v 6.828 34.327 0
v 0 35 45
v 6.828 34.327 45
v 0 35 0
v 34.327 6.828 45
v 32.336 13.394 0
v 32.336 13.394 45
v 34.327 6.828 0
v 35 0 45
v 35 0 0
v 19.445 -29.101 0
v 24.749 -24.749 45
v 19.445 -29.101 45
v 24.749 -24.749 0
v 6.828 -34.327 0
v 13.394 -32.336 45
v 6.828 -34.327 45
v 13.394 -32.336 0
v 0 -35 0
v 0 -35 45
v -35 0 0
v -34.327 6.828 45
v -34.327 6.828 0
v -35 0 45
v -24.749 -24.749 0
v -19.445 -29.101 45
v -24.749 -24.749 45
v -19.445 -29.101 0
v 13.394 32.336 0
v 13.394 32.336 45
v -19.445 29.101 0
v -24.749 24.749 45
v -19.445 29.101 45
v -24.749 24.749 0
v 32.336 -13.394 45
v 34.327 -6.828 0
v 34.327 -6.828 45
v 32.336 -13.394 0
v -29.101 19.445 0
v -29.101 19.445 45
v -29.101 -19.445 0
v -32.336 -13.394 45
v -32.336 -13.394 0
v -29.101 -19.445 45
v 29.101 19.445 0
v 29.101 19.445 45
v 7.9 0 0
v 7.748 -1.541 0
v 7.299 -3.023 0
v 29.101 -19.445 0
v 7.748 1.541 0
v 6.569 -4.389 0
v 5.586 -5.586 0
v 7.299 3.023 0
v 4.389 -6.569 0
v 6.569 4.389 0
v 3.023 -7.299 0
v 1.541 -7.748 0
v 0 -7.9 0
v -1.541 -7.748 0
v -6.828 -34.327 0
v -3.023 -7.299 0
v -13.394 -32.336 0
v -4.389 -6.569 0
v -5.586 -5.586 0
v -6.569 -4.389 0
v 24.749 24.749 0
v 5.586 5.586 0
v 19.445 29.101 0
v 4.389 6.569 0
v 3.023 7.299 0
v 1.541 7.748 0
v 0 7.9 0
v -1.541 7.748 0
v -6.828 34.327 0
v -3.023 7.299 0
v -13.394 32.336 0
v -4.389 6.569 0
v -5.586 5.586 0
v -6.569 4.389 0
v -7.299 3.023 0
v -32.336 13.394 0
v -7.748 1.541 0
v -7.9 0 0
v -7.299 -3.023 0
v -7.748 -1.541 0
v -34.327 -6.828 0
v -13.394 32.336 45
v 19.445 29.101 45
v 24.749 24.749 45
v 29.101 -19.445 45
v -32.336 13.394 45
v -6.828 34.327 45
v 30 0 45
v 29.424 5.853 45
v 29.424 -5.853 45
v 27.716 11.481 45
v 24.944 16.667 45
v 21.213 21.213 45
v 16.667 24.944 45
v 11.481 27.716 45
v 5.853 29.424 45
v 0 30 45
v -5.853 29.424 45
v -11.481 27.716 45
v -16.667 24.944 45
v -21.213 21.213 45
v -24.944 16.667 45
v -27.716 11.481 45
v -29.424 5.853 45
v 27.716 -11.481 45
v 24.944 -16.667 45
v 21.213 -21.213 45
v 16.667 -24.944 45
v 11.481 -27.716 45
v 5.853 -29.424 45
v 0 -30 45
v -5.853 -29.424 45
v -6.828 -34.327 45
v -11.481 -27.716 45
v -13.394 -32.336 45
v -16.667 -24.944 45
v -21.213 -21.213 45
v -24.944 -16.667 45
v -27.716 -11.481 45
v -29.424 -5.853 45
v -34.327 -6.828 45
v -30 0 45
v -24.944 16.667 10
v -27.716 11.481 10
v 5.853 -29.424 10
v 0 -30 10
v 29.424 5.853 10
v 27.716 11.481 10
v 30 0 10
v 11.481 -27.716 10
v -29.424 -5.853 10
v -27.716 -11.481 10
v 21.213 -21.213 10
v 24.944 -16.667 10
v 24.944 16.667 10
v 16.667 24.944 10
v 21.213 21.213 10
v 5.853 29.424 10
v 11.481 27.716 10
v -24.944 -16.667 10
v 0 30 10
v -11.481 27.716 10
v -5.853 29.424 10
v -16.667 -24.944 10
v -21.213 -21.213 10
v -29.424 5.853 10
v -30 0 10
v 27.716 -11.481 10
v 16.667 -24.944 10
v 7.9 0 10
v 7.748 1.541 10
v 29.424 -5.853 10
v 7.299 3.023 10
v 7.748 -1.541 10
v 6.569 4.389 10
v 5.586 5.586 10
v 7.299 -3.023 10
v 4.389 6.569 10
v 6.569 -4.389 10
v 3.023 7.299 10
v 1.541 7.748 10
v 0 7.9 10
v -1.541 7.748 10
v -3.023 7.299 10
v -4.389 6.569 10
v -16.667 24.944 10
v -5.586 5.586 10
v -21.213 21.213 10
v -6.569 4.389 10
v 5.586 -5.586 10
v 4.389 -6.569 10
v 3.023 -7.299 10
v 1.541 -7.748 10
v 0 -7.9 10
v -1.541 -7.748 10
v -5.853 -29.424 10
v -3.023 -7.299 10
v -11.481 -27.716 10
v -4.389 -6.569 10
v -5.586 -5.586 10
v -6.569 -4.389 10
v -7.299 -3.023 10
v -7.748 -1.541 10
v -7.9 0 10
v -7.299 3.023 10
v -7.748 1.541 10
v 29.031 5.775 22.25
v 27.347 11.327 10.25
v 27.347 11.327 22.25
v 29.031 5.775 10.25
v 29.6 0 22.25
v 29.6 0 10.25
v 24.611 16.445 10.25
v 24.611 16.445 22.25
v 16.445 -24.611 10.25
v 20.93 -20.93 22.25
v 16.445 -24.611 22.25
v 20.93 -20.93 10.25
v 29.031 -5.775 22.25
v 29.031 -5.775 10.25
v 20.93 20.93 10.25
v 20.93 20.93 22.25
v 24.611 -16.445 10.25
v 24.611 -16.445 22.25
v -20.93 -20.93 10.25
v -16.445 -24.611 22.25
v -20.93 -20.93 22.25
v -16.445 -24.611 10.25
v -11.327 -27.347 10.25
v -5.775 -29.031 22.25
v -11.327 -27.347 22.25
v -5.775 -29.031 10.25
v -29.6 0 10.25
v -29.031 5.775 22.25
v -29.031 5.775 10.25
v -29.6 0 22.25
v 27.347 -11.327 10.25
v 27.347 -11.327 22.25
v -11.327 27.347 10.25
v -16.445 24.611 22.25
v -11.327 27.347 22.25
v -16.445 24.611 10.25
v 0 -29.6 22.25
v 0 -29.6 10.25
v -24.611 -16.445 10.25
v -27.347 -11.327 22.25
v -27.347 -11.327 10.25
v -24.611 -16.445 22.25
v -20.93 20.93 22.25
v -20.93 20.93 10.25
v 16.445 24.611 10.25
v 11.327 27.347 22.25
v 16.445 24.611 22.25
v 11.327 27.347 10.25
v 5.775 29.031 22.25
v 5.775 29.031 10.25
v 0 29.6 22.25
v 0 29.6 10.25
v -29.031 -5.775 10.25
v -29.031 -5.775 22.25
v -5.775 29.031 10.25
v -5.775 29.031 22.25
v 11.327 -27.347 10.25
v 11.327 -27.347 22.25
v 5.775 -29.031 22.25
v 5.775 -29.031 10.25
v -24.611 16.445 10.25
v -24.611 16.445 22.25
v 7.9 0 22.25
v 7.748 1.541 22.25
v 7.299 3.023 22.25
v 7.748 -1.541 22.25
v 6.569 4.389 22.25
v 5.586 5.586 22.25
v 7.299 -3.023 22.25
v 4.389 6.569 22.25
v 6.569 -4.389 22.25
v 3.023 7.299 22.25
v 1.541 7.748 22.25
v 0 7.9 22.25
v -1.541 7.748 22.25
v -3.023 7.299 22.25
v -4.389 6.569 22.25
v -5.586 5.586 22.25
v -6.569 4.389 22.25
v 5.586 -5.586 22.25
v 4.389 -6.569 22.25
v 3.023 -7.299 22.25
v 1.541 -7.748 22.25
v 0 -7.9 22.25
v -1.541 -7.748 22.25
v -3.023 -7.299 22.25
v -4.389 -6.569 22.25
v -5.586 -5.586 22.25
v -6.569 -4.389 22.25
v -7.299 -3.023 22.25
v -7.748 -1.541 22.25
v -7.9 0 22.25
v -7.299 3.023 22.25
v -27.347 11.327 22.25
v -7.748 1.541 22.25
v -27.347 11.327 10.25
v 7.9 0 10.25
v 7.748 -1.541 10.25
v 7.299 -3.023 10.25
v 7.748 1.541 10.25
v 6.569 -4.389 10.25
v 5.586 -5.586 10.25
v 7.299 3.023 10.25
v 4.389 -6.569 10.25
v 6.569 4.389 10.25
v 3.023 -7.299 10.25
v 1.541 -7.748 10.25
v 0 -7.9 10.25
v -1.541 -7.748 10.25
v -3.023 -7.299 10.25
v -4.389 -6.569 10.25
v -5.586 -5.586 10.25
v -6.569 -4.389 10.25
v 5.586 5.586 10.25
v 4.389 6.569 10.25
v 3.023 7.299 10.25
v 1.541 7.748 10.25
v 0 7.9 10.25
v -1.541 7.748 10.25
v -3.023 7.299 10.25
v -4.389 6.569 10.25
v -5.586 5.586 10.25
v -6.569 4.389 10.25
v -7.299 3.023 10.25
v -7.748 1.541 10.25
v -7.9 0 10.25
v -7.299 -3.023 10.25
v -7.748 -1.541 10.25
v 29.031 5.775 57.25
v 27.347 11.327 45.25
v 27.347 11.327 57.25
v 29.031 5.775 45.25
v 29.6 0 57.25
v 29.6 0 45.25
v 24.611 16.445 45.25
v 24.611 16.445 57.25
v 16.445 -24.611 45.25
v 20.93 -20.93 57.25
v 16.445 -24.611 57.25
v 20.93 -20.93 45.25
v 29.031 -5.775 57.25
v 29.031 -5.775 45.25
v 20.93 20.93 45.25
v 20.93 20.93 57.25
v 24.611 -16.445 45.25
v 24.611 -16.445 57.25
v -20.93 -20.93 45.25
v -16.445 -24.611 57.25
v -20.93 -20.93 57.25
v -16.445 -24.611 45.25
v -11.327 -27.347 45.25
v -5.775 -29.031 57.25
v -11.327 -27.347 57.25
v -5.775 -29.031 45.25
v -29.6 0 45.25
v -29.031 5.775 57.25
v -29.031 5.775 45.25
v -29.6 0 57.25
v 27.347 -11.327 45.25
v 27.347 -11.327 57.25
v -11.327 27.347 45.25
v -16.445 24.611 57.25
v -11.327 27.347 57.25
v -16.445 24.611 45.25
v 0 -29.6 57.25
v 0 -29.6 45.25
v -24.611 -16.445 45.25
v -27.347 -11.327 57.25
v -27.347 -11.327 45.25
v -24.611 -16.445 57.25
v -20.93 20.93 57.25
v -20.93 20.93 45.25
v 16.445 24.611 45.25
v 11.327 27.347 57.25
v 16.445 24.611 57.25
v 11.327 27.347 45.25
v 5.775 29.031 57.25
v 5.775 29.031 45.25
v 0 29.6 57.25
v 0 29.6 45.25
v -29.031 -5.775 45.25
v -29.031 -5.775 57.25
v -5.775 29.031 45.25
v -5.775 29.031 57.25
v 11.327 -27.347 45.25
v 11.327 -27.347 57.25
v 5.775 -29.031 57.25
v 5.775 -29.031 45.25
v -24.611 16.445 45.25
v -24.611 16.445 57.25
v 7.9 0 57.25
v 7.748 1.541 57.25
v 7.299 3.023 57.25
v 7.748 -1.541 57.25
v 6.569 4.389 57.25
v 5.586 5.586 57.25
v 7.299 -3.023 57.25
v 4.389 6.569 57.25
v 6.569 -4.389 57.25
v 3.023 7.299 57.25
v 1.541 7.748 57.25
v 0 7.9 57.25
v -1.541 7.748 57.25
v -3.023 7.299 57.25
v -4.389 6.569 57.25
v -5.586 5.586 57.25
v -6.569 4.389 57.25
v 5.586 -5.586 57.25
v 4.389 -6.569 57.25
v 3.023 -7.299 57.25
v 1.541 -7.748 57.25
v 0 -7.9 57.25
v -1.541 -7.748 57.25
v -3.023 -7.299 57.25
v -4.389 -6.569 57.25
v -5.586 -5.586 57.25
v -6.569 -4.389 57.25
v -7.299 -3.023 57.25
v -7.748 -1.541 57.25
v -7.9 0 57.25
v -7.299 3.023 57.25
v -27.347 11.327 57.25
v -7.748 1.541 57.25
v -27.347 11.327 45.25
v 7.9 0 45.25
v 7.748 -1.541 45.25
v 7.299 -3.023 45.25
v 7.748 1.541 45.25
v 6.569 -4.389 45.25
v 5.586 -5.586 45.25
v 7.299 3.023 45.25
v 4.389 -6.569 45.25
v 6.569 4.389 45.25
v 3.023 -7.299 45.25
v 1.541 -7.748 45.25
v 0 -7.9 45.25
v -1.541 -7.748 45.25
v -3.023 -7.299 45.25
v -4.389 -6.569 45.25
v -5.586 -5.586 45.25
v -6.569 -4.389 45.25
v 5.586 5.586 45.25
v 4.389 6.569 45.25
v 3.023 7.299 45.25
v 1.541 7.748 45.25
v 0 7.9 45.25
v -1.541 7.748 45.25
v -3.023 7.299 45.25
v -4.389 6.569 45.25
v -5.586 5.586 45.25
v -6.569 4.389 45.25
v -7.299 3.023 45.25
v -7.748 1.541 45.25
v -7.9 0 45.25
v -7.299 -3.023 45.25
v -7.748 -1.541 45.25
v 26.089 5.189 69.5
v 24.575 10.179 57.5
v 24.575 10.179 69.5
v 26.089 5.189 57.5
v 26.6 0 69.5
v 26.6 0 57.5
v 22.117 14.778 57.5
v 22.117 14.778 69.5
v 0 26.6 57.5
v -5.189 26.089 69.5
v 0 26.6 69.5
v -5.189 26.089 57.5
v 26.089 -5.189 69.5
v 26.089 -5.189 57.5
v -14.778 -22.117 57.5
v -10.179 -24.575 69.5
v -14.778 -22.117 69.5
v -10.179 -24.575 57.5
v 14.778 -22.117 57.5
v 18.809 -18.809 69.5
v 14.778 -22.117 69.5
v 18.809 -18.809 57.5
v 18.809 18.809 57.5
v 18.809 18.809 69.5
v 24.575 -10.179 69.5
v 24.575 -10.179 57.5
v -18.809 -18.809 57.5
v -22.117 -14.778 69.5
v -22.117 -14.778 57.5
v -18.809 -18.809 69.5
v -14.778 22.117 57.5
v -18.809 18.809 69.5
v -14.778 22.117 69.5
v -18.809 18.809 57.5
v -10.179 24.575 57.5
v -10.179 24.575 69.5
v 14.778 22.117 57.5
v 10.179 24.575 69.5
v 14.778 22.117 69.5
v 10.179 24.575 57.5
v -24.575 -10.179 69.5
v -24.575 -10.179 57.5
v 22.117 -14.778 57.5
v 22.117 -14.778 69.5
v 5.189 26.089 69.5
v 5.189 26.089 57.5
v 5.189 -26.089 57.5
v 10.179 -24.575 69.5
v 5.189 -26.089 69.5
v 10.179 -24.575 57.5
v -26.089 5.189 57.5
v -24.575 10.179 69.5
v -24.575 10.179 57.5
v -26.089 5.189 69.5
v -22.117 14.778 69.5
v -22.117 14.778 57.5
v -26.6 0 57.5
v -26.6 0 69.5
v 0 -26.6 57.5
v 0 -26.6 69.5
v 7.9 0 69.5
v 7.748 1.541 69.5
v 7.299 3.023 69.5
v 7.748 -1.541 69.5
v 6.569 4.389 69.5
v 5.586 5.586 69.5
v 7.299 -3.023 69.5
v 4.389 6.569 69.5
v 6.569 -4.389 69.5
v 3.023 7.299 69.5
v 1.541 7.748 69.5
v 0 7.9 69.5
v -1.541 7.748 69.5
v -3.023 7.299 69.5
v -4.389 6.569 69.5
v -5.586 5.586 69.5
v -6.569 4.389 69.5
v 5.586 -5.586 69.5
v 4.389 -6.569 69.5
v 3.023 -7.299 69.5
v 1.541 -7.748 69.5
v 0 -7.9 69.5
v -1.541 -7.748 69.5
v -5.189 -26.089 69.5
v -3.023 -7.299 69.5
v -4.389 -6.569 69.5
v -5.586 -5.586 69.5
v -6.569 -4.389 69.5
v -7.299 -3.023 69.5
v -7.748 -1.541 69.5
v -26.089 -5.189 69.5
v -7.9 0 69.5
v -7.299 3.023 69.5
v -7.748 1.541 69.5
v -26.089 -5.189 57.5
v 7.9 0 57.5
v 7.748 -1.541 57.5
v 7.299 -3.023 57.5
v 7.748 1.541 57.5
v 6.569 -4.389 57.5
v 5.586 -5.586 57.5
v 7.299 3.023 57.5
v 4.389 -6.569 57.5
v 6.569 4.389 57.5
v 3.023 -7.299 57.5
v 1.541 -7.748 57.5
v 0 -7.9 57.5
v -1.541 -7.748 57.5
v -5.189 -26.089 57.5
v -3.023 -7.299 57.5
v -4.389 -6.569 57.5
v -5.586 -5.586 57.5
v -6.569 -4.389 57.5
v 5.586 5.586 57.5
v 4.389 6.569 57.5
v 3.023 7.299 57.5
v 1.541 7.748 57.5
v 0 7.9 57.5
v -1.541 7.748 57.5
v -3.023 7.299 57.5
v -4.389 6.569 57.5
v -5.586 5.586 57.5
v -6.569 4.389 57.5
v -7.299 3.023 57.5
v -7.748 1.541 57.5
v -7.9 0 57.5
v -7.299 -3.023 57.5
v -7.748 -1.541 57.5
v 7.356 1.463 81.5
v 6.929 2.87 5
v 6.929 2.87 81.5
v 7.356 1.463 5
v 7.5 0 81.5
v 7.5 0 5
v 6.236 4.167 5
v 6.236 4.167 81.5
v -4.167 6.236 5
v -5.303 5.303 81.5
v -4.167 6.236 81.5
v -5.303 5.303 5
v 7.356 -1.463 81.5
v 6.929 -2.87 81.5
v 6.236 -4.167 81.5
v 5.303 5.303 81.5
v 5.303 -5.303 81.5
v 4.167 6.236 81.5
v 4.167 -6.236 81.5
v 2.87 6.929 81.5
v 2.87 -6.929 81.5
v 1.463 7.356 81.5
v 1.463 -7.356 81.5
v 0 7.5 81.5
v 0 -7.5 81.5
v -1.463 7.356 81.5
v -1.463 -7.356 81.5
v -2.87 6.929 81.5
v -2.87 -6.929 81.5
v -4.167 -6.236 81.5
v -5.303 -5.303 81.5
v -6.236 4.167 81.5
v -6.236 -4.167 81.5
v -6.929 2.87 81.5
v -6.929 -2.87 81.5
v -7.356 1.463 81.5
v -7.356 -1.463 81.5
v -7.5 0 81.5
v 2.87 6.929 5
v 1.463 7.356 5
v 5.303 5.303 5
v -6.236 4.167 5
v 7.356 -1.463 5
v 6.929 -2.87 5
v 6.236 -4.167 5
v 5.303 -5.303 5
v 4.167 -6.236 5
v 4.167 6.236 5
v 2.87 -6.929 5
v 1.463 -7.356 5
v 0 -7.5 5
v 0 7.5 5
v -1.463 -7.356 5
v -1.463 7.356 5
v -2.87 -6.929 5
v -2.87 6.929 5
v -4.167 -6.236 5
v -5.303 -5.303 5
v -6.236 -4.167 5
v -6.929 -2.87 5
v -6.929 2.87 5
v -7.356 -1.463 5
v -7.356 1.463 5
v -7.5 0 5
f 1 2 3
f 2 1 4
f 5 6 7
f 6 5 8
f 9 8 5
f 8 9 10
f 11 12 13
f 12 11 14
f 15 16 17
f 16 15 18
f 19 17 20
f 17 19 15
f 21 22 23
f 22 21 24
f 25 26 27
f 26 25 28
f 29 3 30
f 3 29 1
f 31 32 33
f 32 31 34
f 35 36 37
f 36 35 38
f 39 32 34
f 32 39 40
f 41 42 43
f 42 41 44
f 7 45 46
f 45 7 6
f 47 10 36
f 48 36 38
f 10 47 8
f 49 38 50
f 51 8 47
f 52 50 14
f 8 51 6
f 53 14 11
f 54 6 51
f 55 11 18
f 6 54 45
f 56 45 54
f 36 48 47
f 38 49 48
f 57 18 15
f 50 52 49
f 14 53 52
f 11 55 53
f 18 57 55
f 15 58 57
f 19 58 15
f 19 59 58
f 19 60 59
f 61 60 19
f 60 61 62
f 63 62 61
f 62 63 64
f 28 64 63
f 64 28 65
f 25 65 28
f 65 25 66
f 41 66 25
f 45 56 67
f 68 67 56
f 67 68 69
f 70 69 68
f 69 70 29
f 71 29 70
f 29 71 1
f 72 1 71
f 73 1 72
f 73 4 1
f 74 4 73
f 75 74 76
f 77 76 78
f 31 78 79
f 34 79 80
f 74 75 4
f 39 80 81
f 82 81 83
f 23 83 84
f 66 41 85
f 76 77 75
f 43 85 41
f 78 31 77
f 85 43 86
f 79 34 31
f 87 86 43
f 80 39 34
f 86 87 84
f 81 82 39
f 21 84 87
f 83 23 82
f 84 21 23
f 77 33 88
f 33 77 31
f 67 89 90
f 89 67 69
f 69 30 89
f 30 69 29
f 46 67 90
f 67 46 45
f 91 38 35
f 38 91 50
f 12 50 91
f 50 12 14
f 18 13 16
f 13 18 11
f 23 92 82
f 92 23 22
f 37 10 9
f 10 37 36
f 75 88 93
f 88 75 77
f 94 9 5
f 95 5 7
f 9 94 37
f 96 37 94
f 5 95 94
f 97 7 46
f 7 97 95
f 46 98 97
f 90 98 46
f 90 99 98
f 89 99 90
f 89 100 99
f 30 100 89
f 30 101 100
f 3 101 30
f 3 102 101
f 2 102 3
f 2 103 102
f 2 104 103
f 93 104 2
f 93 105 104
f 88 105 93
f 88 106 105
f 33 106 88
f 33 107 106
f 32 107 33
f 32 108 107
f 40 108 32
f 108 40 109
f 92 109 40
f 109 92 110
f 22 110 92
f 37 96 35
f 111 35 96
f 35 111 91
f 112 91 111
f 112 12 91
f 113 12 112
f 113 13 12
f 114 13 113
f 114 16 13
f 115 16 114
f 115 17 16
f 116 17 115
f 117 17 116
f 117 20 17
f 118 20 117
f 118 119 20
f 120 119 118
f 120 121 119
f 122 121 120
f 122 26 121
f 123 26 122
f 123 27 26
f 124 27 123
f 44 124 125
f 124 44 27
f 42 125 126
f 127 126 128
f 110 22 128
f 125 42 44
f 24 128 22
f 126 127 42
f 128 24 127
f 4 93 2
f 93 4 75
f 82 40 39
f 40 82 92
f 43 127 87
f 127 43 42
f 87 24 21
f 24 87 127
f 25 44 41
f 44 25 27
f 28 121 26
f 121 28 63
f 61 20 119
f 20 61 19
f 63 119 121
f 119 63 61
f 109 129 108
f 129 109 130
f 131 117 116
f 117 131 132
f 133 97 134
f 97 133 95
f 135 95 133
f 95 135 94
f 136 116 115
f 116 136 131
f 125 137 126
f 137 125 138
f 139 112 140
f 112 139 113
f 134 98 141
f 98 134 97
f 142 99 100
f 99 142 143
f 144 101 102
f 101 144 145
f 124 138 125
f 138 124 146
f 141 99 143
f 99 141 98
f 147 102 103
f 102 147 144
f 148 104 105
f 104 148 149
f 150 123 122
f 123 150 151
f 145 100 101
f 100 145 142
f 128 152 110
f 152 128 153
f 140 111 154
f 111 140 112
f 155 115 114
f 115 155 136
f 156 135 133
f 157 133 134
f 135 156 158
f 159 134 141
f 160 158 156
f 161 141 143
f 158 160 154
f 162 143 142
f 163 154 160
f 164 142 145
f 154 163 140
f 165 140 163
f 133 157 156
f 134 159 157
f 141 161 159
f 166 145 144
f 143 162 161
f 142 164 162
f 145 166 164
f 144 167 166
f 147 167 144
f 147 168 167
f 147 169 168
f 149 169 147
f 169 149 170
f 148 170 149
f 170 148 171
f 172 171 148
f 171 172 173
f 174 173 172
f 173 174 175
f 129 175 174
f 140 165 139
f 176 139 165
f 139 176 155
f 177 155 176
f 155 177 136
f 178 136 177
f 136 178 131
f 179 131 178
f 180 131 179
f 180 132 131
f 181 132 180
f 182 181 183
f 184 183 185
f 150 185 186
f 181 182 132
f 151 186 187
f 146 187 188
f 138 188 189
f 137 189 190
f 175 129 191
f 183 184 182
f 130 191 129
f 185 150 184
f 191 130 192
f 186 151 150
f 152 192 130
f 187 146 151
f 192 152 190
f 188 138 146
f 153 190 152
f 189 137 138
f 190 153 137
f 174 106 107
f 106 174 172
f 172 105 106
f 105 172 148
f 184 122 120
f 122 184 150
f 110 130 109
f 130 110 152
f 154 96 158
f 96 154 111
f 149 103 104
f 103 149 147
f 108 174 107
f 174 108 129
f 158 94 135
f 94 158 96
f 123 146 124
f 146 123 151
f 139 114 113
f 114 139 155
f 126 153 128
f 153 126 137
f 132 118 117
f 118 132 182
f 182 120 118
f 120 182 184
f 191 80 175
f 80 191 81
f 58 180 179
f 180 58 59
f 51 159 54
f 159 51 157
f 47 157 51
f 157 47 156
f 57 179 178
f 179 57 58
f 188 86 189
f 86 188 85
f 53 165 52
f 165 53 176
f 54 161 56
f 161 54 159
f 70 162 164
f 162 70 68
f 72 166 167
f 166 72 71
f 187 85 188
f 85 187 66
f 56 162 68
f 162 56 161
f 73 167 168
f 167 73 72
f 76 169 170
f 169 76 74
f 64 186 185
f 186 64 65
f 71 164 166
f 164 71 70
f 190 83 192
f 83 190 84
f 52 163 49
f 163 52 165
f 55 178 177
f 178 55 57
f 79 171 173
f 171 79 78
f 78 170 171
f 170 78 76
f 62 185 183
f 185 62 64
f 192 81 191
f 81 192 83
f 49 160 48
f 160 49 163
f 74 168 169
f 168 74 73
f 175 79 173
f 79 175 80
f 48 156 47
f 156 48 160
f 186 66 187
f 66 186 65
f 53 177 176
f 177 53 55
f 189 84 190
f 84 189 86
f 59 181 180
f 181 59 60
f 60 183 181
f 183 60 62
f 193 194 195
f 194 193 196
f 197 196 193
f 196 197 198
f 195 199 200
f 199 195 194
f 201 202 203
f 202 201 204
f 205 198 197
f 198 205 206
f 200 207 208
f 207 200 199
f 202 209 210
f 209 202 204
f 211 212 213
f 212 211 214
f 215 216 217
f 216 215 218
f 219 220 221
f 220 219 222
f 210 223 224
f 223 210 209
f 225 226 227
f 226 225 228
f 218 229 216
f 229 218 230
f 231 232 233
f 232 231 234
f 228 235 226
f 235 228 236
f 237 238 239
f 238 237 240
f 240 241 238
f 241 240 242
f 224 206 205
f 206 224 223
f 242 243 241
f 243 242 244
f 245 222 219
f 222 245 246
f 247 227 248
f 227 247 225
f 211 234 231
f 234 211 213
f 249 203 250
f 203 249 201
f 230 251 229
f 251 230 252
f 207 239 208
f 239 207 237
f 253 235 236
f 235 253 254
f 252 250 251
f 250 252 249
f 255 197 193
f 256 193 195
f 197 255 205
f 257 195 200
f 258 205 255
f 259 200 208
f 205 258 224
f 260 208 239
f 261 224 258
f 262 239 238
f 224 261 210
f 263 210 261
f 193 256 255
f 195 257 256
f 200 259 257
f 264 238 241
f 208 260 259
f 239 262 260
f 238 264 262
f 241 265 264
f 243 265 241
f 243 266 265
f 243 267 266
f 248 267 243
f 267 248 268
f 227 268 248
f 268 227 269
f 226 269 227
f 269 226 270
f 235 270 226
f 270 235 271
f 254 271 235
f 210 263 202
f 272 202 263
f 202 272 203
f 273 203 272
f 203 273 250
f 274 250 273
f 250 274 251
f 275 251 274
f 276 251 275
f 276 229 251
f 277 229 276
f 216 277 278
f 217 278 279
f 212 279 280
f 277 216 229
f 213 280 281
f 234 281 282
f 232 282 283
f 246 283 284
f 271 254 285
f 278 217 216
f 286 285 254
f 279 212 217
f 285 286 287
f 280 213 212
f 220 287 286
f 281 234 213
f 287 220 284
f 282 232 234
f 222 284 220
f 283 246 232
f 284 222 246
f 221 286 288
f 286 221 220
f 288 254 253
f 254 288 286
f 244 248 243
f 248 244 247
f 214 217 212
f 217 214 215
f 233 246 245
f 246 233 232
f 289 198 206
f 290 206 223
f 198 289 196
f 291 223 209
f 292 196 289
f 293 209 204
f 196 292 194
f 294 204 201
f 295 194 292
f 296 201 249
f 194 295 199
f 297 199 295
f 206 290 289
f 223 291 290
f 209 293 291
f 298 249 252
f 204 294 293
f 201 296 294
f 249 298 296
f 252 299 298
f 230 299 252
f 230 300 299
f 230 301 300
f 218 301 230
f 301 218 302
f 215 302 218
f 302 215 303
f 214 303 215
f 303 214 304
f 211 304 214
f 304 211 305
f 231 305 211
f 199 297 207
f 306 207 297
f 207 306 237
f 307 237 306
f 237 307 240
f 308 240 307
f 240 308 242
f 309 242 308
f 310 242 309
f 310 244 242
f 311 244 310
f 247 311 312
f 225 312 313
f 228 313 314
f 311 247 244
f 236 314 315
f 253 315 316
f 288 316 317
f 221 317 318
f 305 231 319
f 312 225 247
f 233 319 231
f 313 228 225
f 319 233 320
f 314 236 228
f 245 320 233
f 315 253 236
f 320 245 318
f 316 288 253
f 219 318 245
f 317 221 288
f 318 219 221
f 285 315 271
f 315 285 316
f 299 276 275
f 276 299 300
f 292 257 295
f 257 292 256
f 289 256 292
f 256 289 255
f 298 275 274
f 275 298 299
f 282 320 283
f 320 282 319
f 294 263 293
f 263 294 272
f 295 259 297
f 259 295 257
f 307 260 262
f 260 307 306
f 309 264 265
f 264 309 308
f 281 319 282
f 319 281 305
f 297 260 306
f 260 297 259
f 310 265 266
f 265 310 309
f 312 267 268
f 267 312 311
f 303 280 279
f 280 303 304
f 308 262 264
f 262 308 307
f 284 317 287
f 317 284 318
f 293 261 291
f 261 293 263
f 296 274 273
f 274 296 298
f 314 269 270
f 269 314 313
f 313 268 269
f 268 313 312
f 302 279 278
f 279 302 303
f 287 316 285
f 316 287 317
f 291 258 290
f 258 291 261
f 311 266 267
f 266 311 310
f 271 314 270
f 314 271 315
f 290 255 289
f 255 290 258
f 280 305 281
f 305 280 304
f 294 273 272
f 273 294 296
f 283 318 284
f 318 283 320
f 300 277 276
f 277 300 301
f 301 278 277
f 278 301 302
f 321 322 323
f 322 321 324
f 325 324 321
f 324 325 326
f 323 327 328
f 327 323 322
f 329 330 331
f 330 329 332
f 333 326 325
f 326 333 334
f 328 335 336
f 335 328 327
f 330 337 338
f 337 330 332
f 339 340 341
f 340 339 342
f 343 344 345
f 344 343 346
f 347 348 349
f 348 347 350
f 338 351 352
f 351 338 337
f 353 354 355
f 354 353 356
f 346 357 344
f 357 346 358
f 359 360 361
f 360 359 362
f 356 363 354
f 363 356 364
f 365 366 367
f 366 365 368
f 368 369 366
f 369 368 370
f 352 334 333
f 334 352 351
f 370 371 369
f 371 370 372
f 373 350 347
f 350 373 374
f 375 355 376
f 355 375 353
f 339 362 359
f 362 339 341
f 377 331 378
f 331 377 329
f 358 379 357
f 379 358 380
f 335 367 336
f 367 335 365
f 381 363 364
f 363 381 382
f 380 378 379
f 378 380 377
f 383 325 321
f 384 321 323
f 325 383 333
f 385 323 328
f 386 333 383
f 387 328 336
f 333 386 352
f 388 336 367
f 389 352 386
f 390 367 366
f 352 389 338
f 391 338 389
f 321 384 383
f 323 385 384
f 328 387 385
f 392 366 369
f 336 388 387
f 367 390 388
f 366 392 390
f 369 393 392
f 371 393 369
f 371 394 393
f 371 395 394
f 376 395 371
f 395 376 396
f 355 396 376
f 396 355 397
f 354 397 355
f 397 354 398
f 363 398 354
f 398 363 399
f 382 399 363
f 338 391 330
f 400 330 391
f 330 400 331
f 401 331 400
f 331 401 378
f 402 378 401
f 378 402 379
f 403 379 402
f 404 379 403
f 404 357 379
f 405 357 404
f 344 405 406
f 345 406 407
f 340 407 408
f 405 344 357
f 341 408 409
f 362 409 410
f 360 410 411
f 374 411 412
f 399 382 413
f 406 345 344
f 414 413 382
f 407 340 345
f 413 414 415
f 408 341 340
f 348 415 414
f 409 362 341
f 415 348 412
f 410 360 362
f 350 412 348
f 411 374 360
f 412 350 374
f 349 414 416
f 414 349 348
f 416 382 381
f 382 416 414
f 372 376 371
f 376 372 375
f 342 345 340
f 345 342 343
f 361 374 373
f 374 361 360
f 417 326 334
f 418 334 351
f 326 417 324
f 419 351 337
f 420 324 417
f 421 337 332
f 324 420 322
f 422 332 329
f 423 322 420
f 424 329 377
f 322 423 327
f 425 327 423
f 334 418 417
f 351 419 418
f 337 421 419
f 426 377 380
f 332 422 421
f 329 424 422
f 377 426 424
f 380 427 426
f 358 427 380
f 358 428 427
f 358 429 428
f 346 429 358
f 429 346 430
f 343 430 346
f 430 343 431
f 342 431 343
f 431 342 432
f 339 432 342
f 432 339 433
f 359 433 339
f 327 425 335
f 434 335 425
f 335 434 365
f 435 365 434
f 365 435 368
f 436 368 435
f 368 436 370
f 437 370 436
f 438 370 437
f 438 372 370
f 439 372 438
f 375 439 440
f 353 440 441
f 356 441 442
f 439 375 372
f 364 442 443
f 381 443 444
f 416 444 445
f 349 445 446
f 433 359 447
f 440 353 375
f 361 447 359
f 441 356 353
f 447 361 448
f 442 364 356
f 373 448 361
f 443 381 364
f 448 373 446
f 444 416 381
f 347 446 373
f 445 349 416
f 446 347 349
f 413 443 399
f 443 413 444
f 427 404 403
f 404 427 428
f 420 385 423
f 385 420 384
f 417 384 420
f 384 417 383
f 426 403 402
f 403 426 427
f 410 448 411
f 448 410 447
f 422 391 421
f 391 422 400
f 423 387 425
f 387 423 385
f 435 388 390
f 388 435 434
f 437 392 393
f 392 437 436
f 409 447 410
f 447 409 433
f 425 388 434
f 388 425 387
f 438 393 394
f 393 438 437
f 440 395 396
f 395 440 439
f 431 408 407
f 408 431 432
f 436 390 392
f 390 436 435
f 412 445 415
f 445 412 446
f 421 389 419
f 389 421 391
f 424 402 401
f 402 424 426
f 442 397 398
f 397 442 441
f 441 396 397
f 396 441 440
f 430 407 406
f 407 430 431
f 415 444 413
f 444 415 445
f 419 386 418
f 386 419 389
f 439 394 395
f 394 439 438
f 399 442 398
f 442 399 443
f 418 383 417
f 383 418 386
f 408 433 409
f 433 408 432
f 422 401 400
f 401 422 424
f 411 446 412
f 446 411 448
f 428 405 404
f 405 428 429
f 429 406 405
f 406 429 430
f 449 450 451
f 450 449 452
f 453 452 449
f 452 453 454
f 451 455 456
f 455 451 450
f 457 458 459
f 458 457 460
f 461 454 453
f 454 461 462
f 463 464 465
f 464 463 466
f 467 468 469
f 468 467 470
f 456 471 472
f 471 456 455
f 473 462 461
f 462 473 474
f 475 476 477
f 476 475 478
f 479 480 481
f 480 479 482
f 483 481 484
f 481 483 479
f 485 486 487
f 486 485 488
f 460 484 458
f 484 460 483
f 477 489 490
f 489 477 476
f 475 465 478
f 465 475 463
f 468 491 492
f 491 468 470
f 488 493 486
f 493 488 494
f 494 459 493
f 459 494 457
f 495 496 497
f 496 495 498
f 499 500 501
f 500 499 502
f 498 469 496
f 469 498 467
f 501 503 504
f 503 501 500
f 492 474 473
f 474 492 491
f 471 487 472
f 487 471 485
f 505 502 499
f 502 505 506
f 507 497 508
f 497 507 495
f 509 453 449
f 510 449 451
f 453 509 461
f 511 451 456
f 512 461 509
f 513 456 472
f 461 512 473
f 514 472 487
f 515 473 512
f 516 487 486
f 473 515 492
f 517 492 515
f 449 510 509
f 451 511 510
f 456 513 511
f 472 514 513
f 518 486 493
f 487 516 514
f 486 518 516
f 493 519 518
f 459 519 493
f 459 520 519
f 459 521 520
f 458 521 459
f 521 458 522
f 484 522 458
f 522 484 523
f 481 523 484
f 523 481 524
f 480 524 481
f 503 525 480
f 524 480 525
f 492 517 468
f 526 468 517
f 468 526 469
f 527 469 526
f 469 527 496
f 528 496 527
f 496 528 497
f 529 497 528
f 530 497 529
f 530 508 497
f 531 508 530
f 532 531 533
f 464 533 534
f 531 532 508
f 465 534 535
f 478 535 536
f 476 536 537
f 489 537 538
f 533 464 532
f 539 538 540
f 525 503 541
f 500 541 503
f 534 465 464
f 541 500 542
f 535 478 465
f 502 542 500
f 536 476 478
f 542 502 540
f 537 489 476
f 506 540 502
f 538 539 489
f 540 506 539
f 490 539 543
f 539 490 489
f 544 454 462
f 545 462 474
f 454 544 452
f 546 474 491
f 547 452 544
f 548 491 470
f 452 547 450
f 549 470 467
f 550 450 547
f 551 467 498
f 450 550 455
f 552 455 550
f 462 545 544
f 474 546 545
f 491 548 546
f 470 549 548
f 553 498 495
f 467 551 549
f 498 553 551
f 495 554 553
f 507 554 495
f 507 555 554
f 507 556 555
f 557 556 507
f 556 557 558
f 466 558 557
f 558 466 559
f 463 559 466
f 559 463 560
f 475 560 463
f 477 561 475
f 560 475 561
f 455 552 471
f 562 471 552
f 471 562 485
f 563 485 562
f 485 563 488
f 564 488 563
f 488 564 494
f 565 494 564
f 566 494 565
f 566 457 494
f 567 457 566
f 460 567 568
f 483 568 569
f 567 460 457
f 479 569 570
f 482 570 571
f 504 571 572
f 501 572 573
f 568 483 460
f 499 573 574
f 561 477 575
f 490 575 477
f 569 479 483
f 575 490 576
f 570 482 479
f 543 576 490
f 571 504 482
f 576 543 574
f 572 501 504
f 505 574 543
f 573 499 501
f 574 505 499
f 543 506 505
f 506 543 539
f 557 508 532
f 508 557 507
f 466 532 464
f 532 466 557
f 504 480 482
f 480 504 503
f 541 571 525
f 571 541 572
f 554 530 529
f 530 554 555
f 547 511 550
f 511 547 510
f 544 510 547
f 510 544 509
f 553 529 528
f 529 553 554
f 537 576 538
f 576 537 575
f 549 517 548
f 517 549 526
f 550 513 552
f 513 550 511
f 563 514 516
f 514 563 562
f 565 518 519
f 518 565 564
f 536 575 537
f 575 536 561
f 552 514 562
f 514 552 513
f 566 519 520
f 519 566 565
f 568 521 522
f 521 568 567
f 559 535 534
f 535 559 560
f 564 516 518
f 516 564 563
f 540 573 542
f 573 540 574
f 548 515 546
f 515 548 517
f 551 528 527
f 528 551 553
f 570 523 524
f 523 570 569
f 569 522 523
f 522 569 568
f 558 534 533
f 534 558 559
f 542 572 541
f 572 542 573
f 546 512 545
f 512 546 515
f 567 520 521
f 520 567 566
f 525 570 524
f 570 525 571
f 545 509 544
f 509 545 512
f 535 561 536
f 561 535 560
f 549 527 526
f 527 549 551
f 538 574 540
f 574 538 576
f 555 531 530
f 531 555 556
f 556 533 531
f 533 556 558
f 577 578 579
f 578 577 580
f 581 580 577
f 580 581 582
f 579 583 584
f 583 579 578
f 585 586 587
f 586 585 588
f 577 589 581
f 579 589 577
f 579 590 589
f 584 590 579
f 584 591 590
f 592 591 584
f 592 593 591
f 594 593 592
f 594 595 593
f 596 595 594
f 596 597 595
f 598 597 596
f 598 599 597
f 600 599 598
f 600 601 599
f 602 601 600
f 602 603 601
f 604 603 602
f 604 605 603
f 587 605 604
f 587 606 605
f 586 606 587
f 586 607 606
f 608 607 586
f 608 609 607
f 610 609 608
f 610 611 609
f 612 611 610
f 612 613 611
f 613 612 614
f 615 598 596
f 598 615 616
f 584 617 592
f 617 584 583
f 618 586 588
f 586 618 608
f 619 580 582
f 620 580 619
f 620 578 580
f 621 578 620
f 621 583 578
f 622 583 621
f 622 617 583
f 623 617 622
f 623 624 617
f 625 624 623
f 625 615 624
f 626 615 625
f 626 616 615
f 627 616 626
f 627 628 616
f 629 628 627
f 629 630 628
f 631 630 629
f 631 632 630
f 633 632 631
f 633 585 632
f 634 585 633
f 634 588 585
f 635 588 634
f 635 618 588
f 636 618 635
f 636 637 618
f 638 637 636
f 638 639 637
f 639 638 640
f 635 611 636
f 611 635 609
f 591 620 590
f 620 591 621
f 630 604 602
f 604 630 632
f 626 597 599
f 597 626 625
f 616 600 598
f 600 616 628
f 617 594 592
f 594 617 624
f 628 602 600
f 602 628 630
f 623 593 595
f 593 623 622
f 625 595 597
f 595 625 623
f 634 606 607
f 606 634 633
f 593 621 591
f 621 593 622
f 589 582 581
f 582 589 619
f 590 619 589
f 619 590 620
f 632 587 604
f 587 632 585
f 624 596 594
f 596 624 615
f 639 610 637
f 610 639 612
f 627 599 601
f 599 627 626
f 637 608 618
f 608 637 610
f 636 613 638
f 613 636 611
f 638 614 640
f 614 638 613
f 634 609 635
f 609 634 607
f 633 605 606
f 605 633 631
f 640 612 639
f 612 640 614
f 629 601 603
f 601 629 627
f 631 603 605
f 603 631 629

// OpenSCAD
$fn = 32;

// ------------------------------------------------------------------------
// Bearing housing: housing d70, two bearings and a shaft
// Every part is its own module, assembly() places them once.
// ------------------------------------------------------------------------

// --- part 1 ---
module housing() {
  difference() {
    cylinder(h = 45, d = 70);
    translate([0, 0, 10]) cylinder(h = 36, d = 60);
    translate([0, 0, -1]) cylinder(h = 12, d = 15.8);
  }
}

// --- part 2 ---
module bearing_lower() {
  difference() {
      translate([0, 0, 0]) cylinder(h = 12, d = 59.2);
      translate([0, 0, -1]) cylinder(h = 14, d = 15.8);
    }
}

// --- part 3 ---
module bearing_upper() {
  difference() {
      translate([0, 0, 0]) cylinder(h = 12, d = 59.2);
      translate([0, 0, -1]) cylinder(h = 14, d = 15.8);
    }
}

// --- part 4 ---
module spacer() {
  difference() {
      translate([0, 0, 0]) cylinder(h = 12, d = 53.2);
      translate([0, 0, -1]) cylinder(h = 14, d = 15.8);
    }
}

// --- part 5 ---
module shaft() {
  translate([0, 0, -38.25]) cylinder(h = 76.5, d = 15);
}

// --- assembly ---
module assembly() {
  translate([0, 0, 0]) rotate([0, 0, 0]) housing();
  translate([0, 0, 10.25]) rotate([0, 0, 0]) bearing_lower();
  translate([0, 0, 45.25]) rotate([0, 0, 0]) bearing_upper();
  translate([0, 0, 57.5]) rotate([0, 0, 0]) spacer();
  translate([0, 0, 43.25]) rotate([0, 0, 0]) shaft();
}

assembly();
